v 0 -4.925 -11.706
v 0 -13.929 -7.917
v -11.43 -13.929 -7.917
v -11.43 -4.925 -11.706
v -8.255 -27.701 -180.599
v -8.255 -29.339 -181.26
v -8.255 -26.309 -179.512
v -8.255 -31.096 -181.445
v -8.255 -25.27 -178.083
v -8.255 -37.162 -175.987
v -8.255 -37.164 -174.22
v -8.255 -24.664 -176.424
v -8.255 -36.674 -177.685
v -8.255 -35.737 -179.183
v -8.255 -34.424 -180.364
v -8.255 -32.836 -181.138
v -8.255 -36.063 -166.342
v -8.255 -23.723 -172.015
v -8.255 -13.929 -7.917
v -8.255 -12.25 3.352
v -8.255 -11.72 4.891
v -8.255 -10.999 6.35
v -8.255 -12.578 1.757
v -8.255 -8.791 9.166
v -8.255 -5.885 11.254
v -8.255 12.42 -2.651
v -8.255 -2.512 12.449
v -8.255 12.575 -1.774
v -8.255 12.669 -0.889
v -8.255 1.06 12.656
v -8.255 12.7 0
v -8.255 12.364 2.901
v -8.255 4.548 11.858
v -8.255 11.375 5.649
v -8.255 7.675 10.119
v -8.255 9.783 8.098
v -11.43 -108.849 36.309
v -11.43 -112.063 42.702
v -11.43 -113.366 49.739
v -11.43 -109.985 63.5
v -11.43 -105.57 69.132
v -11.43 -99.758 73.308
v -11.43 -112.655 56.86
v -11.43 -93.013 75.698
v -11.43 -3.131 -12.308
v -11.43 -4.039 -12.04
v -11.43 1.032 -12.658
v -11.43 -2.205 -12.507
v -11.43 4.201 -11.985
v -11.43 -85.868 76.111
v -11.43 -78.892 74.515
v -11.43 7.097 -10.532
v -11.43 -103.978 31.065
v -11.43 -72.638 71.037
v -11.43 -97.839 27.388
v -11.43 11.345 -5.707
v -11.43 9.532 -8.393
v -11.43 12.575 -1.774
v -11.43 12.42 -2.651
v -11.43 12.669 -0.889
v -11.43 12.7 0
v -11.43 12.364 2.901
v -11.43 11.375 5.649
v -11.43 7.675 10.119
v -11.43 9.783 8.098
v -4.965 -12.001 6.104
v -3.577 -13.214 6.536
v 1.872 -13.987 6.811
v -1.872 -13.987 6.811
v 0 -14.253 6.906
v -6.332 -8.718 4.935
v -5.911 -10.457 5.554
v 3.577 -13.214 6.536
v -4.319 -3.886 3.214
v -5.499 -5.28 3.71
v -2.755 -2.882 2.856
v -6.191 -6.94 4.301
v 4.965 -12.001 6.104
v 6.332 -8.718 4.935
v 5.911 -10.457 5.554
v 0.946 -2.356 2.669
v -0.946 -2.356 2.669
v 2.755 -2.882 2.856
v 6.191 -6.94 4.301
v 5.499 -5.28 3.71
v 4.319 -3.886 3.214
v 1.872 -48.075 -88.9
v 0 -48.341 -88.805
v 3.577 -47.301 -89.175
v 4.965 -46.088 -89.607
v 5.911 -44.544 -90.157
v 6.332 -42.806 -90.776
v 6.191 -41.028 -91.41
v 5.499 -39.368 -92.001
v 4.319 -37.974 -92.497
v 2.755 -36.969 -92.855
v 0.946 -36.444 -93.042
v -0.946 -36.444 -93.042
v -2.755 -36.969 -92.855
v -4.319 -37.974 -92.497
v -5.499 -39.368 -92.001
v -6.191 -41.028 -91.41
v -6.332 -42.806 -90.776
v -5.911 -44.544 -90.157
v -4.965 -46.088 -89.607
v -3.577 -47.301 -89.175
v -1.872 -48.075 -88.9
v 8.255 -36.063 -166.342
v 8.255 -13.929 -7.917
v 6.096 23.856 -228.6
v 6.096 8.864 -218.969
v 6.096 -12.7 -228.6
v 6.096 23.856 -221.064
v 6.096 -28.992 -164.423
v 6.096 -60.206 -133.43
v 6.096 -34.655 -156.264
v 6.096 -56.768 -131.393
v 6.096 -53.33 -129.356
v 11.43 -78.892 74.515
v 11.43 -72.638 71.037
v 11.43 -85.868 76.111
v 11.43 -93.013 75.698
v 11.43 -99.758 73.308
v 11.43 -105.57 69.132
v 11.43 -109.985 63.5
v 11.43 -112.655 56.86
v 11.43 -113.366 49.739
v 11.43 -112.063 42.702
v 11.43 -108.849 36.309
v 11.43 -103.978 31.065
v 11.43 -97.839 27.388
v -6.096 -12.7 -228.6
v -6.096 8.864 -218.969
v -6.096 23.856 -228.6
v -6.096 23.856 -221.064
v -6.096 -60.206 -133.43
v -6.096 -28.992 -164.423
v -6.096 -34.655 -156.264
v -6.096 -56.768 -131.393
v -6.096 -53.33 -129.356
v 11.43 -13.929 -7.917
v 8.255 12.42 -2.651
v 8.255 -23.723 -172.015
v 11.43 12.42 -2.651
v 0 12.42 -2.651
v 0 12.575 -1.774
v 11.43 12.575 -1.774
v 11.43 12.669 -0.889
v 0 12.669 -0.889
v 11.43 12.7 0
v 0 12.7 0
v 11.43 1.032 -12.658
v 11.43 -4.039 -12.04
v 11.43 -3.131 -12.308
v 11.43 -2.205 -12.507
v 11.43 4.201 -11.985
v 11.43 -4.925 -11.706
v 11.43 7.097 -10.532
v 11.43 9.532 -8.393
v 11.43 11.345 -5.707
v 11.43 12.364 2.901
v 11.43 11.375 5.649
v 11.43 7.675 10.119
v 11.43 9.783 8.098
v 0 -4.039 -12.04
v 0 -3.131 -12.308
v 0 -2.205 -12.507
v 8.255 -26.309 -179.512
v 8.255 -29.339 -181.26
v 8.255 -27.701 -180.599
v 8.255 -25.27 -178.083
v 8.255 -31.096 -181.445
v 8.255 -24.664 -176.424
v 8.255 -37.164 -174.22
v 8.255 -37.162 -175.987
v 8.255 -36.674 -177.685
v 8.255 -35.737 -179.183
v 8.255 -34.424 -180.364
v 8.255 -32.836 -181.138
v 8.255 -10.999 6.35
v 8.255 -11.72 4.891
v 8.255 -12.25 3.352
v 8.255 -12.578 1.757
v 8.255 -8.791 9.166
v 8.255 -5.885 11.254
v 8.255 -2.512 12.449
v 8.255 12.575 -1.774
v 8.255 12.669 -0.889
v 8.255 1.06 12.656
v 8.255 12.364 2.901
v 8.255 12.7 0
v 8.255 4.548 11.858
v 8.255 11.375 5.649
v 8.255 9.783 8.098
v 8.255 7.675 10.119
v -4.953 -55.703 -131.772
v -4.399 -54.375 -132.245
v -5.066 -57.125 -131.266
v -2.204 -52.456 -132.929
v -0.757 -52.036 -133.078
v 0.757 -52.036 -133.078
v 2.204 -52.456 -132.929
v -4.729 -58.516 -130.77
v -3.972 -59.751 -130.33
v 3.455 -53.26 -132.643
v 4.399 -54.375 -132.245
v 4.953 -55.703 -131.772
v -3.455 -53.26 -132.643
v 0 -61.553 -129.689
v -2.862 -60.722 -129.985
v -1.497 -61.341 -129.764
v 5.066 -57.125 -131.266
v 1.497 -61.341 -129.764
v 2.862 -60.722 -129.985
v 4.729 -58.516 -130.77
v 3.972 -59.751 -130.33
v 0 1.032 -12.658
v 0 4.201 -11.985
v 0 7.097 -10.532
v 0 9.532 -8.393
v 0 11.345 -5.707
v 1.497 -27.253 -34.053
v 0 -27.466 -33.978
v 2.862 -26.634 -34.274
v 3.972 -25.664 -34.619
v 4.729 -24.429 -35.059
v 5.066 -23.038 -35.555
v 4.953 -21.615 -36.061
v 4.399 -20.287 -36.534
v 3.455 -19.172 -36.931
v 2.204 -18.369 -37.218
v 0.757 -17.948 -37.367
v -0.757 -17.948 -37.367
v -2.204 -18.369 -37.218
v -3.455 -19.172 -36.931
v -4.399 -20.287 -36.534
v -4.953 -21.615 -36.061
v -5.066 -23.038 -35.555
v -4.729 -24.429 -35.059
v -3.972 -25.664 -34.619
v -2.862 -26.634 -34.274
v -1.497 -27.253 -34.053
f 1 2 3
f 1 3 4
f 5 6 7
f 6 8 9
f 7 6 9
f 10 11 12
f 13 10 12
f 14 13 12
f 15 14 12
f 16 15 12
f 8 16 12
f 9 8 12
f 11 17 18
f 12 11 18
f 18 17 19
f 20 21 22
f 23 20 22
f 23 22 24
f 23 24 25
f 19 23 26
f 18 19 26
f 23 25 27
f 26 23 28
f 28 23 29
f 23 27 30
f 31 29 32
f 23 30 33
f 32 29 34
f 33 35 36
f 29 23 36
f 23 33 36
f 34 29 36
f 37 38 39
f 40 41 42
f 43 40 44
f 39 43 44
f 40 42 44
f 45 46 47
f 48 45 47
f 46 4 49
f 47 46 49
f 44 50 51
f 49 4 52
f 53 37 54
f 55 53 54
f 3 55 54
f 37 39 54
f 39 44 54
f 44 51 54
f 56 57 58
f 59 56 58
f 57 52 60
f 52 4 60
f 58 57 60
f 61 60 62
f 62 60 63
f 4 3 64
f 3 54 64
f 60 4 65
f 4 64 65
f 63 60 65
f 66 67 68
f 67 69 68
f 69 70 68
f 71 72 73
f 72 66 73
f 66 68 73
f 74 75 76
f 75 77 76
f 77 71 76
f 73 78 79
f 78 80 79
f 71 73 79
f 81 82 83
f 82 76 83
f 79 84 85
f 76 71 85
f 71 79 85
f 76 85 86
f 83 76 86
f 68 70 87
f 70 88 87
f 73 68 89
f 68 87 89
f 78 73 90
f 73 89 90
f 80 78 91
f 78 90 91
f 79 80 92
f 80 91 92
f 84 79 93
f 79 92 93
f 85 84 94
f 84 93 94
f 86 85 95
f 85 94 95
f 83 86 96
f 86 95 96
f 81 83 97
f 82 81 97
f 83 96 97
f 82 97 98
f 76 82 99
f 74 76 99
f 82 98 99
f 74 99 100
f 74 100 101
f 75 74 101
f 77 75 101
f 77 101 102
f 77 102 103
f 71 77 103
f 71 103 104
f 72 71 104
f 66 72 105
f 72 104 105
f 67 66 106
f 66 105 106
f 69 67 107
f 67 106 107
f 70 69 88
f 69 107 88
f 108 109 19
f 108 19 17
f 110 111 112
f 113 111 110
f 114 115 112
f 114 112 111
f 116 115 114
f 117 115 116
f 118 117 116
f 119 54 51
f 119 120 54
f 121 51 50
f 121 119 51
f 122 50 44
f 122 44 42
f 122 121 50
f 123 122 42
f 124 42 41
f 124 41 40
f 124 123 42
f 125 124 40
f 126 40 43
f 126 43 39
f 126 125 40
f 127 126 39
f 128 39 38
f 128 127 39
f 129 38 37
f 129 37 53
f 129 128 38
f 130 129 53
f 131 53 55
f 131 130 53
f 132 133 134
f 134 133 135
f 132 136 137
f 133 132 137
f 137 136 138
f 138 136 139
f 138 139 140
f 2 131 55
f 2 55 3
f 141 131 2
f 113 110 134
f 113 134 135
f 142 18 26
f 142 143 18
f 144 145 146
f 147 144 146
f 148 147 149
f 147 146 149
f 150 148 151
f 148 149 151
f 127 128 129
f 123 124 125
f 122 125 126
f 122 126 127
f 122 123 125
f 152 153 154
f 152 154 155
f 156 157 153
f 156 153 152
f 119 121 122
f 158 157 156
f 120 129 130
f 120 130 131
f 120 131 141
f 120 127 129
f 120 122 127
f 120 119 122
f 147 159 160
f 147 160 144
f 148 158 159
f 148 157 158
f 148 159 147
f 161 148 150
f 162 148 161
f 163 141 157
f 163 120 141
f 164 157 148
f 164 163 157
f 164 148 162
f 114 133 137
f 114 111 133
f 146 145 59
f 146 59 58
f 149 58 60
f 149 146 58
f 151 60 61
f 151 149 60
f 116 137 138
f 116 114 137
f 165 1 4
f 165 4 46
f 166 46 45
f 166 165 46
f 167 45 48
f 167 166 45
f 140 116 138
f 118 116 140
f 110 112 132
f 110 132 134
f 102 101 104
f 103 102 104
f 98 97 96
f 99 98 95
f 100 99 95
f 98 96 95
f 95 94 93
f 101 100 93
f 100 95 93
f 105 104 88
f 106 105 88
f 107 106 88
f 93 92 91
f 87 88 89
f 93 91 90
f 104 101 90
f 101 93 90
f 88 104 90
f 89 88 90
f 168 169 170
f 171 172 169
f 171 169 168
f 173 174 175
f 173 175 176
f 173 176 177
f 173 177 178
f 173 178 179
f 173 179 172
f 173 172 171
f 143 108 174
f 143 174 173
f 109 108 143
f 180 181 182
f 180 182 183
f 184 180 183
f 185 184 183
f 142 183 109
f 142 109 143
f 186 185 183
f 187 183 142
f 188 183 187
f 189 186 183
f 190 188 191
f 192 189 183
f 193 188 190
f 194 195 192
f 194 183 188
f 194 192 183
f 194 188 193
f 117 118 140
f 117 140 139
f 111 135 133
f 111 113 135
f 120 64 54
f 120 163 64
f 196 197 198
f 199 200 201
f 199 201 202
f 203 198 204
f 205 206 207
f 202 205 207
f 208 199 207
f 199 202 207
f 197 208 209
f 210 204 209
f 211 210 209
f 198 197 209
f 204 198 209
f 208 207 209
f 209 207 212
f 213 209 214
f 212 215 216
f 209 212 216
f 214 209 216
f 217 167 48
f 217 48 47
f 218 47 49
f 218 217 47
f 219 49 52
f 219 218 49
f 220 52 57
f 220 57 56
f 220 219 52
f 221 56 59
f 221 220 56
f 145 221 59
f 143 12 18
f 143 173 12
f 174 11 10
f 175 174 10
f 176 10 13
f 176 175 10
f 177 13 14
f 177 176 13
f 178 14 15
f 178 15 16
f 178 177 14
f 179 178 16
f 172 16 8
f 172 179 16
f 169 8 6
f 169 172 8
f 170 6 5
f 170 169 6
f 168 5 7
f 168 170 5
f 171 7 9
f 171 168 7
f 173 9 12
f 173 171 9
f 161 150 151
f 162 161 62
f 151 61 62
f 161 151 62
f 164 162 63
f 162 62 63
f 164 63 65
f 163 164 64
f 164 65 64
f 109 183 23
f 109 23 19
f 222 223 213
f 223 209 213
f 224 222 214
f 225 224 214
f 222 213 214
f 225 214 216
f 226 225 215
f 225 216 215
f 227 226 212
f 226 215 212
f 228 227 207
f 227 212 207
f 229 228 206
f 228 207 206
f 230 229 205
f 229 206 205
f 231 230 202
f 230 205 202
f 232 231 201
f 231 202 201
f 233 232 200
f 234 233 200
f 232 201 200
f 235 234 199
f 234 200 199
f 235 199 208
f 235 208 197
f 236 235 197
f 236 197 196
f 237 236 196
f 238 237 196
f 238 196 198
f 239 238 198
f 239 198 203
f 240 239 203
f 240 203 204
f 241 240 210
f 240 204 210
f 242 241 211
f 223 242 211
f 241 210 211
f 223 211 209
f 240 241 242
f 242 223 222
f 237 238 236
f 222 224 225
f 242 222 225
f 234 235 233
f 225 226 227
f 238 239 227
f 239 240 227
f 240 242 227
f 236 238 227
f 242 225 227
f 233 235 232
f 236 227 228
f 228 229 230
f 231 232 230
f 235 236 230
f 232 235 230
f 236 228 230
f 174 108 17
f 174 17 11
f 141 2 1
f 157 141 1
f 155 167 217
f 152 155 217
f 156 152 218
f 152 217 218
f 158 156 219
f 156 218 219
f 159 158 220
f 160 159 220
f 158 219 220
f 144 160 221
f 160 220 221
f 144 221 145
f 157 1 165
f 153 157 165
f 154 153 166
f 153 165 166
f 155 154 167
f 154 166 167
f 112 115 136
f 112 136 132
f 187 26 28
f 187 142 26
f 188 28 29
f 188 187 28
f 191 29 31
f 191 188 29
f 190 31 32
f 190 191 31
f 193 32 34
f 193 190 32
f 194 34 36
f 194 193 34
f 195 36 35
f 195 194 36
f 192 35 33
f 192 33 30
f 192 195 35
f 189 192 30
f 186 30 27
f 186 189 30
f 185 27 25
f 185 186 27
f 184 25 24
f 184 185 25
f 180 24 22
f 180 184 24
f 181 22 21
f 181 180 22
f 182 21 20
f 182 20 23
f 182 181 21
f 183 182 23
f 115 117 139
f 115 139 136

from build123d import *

# Parameters (mm, degrees)
F1_DEPTH = 11.43
F2_DEPTH = 8.255
F3_DEPTH = 6.096


with BuildPart() as f1:
    # F0 (on Right) → F1 (new body, symmetric)
    with BuildSketch(Plane.YZ):
        with BuildLine():
            ThreePointArc((-65.9911357684, 38.1), (-63.4536650368, 44.2259962544), (-62.5881810245, 50.8))
            ThreePointArc((-62.5881810245, 50.8), (-65.2389992765, 62.097554151), (-72.6381597485, 71.0370167472))
            ThreePointArc((-72.6381597485, 71.0370167472), (-109.9852262806, 63.5), (-97.8389409864, 27.3879832528))
            ThreePointArc((-97.8389409864, 27.3879832528), (-79.890657495, 26.7253221685), (-65.9911357684, 38.1))
        make_face()
        with BuildLine():
            ThreePointArc((-72.6381597485, 71.0370167472), (-65.2389992765, 62.097554151), (-62.5881810245, 50.8))
            ThreePointArc((-62.5881810245, 50.8), (-63.4536650368, 44.2259962544), (-65.9911357684, 38.1))
            Line((-65.9911357684, 38.1), (-10.9985226281, 6.35))
            ThreePointArc((-10.9985226281, 6.35), (-2.5123389157, 12.4490221774), (7.675010638, 10.1185083736))
            Line((7.675010638, 10.1185083736), (-72.6381597485, 71.0370167472))
        make_face()
        with BuildLine():
            Line((-10.9985226281, 6.35), (-65.9911357684, 38.1))
            ThreePointArc((-65.9911357684, 38.1), (-79.890657495, 26.7253221685), (-97.8389409864, 27.3879832528))
            Line((-97.8389409864, 27.3879832528), (-13.9294910287, -7.9174694553))
            Line((-13.9294910287, -7.9174694553), (-12.5778413298, 1.7572442865))
            ThreePointArc((-12.5778413298, 1.7572442865), (-12.0097704237, 4.1298201378), (-10.9985226281, 6.35))
        make_face()
        with BuildLine():
            Line((-12.5778413298, 1.7572442865), (-13.9294910287, -7.9174694553))
            Line((-13.9294910287, -7.9174694553), (-4.925379981, -11.7060083736))
            ThreePointArc((-4.925379981, -11.7060083736), (-11.0410815644, -6.2757085567), (-12.5778413298, 1.7572442865))
        make_face()
        with BuildLine():
            Line((0, 0), (-10.9985226281, 6.35))
            ThreePointArc((-10.9985226281, 6.35), (-12.0097704237, 4.1298201378), (-12.5778413298, 1.7572442865))
            ThreePointArc((-12.5778413298, 1.7572442865), (-11.0410815644, -6.2757085567), (-4.925379981, -11.7060083736))
            ThreePointArc((-4.925379981, -11.7060083736), (-3.587782482, -12.1826851253), (-2.2053318564, -12.5070584633))
            Line((-2.2053318564, -12.5070584633), (0, 0))
        make_face()
        with BuildLine():
            ThreePointArc((12.7, 0), (11.374590874, 5.6487770755), (7.675010638, 10.1185083736))
            ThreePointArc((7.675010638, 10.1185083736), (-2.5123389157, 12.4490221774), (-10.9985226281, 6.35))
            Line((-10.9985226281, 6.35), (0, 0))
            Line((0, 0), (-2.2053318564, -12.5070584633))
            ThreePointArc((-2.2053318564, -12.5070584633), (7.097457242, -10.5316713155), (12.4203176258, -2.6506056054))
            ThreePointArc((12.4203176258, -2.6506056054), (12.6298858634, -1.3326601504), (12.7, 0))
        make_face()
    extrude(amount=F1_DEPTH, both=True)


with BuildPart() as f2:
    # F0 (on Right) → F2 (new body, symmetric)
    with BuildSketch(Plane.YZ):
        with BuildLine():
            ThreePointArc((12.7, 0), (11.374590874, 5.6487770755), (7.675010638, 10.1185083736))
            ThreePointArc((7.675010638, 10.1185083736), (-2.5123389157, 12.4490221774), (-10.9985226281, 6.35))
            Line((-10.9985226281, 6.35), (0, 0))
            Line((0, 0), (-2.2053318564, -12.5070584633))
            ThreePointArc((-2.2053318564, -12.5070584633), (7.097457242, -10.5316713155), (12.4203176258, -2.6506056054))
            ThreePointArc((12.4203176258, -2.6506056054), (12.6298858634, -1.3326601504), (12.7, 0))
        make_face()
        with BuildLine():
            Line((0, 0), (-10.9985226281, 6.35))
            ThreePointArc((-10.9985226281, 6.35), (-12.0097704237, 4.1298201378), (-12.5778413298, 1.7572442865))
            ThreePointArc((-12.5778413298, 1.7572442865), (-11.0410815644, -6.2757085567), (-4.925379981, -11.7060083736))
            ThreePointArc((-4.925379981, -11.7060083736), (-3.587782482, -12.1826851253), (-2.2053318564, -12.5070584633))
            Line((-2.2053318564, -12.5070584633), (0, 0))
        make_face()
        with BuildLine():
            Line((-23.723489121, -172.0147535919), (12.4203176258, -2.6506056054))
            ThreePointArc((12.4203176258, -2.6506056054), (7.097457242, -10.5316713155), (-2.2053318564, -12.5070584633))
            Line((-2.2053318564, -12.5070584633), (-28.992237411, -164.4231489389))
            Line((-28.992237411, -164.4231489389), (-23.723489121, -172.0147535919))
        make_face()
        with BuildLine():
            Line((-4.925379981, -11.7060083736), (-13.9294910287, -7.9174694553))
            Line((-13.9294910287, -7.9174694553), (-34.6549081477, -156.2639515077))
            Line((-34.6549081477, -156.2639515077), (-28.992237411, -164.4231489389))
            Line((-28.992237411, -164.4231489389), (-2.2053318564, -12.5070584633))
            ThreePointArc((-2.2053318564, -12.5070584633), (-3.587782482, -12.1826851253), (-4.925379981, -11.7060083736))
        make_face()
        with BuildLine():
            Line((-12.5778413298, 1.7572442865), (-13.9294910287, -7.9174694553))
            Line((-13.9294910287, -7.9174694553), (-4.925379981, -11.7060083736))
            ThreePointArc((-4.925379981, -11.7060083736), (-11.0410815644, -6.2757085567), (-12.5778413298, 1.7572442865))
        make_face()
        with BuildLine():
            Line((-30.8746459892, -175.0988184856), (-34.1112782872, -169.6356041051))
            ThreePointArc((-34.1112782872, -169.6356041051), (-36.1603494719, -171.5797506129), (-37.1635666541, -174.2201963423))
            ThreePointArc((-37.1635666541, -174.2201963423), (-34.4239015535, -180.3642989897), (-27.7007466935, -180.5987151447))
            Line((-27.7007466935, -180.5987151447), (-30.8746459892, -175.0988184856))
        make_face()
        with BuildLine():
            Line((-28.992237411, -164.4231489389), (-34.6549081477, -156.2639515077))
            Line((-34.6549081477, -156.2639515077), (-36.0628382689, -166.341504073))
            Line((-36.0628382689, -166.341504073), (-34.1112782872, -169.6356041051))
            ThreePointArc((-34.1112782872, -169.6356041051), (-32.0124519954, -168.8515872995), (-29.771980061, -168.8452892539))
            Line((-29.771980061, -168.8452892539), (-28.992237411, -164.4231489389))
        make_face()
        with BuildLine():
            Line((-34.1112782872, -169.6356041051), (-36.0628382689, -166.341504073))
            Line((-36.0628382689, -166.341504073), (-37.1635666541, -174.2201963423))
            ThreePointArc((-37.1635666541, -174.2201963423), (-36.1603494719, -171.5797506129), (-34.1112782872, -169.6356041051))
        make_face()
        with BuildLine():
            Line((-23.723489121, -172.0147535919), (-28.992237411, -164.4231489389))
            Line((-28.992237411, -164.4231489389), (-29.771980061, -168.8452892539))
            ThreePointArc((-29.771980061, -168.8452892539), (-26.0102637754, -171.0171171641), (-24.5246459892, -175.0988184856))
            ThreePointArc((-24.5246459892, -175.0988184856), (-24.5597030575, -175.7651485608), (-24.6644871763, -176.4241212882))
            Line((-24.6644871763, -176.4241212882), (-23.723489121, -172.0147535919))
        make_face()
        with BuildLine():
            ThreePointArc((-24.5246459892, -175.0988184856), (-26.0102637754, -171.0171171641), (-29.771980061, -168.8452892539))
            Line((-29.771980061, -168.8452892539), (-30.8746459892, -175.0988184856))
            Line((-30.8746459892, -175.0988184856), (-27.7007466935, -180.5987151447))
            ThreePointArc((-27.7007466935, -180.5987151447), (-25.7392837709, -178.8338626469), (-24.6644871763, -176.4241212882))
            ThreePointArc((-24.6644871763, -176.4241212882), (-24.5597030575, -175.7651485608), (-24.5246459892, -175.0988184856))
        make_face()
        with BuildLine():
            ThreePointArc((-29.771980061, -168.8452892539), (-32.0124519954, -168.8515872995), (-34.1112782872, -169.6356041051))
            Line((-34.1112782872, -169.6356041051), (-30.8746459892, -175.0988184856))
            Line((-30.8746459892, -175.0988184856), (-29.771980061, -168.8452892539))
        make_face()
        with BuildLine():
            Line((-23.723489121, -172.0147535919), (-28.992237411, -164.4231489389))
            Line((-28.992237411, -164.4231489389), (-29.771980061, -168.8452892539))
            ThreePointArc((-29.771980061, -168.8452892539), (-26.0102637754, -171.0171171641), (-24.5246459892, -175.0988184856))
            ThreePointArc((-24.5246459892, -175.0988184856), (-24.5597030575, -175.7651485608), (-24.6644871763, -176.4241212882))
            Line((-24.6644871763, -176.4241212882), (-23.723489121, -172.0147535919))
        make_face()
    extrude(amount=F2_DEPTH, both=True)


with BuildPart() as f3:
    # F0 (on Right) → F3 (new body, symmetric)
    with BuildSketch(Plane.YZ):
        with BuildLine():
            Line((-37.1635666541, -174.2201963423), (-36.0628382689, -166.341504073))
            Line((-36.0628382689, -166.341504073), (-56.7677043733, -131.3931034415))
            Line((-56.7677043733, -131.3931034415), (-60.2058892669, -133.4300252055))
            Line((-60.2058892669, -133.4300252055), (-12.7, -228.6))
            Line((-12.7, -228.6), (0, -228.6))
            Line((0, -228.6), (-27.7007466935, -180.5987151447))
            ThreePointArc((-27.7007466935, -180.5987151447), (-34.4239015535, -180.3642989897), (-37.1635666541, -174.2201963423))
        make_face()
        Polygon((-36.0628382689, -166.341504073), (-34.6549081477, -156.2639515077), (-53.3295194797, -129.3561816774), (-56.7677043733, -131.3931034415), align=None)
        with BuildLine():
            Line((-28.992237411, -164.4231489389), (-34.6549081477, -156.2639515077))
            Line((-34.6549081477, -156.2639515077), (-36.0628382689, -166.341504073))
            Line((-36.0628382689, -166.341504073), (-34.1112782872, -169.6356041051))
            ThreePointArc((-34.1112782872, -169.6356041051), (-32.0124519954, -168.8515872995), (-29.771980061, -168.8452892539))
            Line((-29.771980061, -168.8452892539), (-28.992237411, -164.4231489389))
        make_face()
        with BuildLine():
            Line((-34.1112782872, -169.6356041051), (-36.0628382689, -166.341504073))
            Line((-36.0628382689, -166.341504073), (-37.1635666541, -174.2201963423))
            ThreePointArc((-37.1635666541, -174.2201963423), (-36.1603494719, -171.5797506129), (-34.1112782872, -169.6356041051))
        make_face()
        with BuildLine():
            Line((-30.8746459892, -175.0988184856), (-34.1112782872, -169.6356041051))
            ThreePointArc((-34.1112782872, -169.6356041051), (-36.1603494719, -171.5797506129), (-37.1635666541, -174.2201963423))
            ThreePointArc((-37.1635666541, -174.2201963423), (-34.4239015535, -180.3642989897), (-27.7007466935, -180.5987151447))
            Line((-27.7007466935, -180.5987151447), (-30.8746459892, -175.0988184856))
        make_face()
        with BuildLine():
            ThreePointArc((-29.771980061, -168.8452892539), (-32.0124519954, -168.8515872995), (-34.1112782872, -169.6356041051))
            Line((-34.1112782872, -169.6356041051), (-30.8746459892, -175.0988184856))
            Line((-30.8746459892, -175.0988184856), (-29.771980061, -168.8452892539))
        make_face()
        with BuildLine():
            Line((-23.723489121, -172.0147535919), (-28.992237411, -164.4231489389))
            Line((-28.992237411, -164.4231489389), (-29.771980061, -168.8452892539))
            ThreePointArc((-29.771980061, -168.8452892539), (-26.0102637754, -171.0171171641), (-24.5246459892, -175.0988184856))
            ThreePointArc((-24.5246459892, -175.0988184856), (-24.5597030575, -175.7651485608), (-24.6644871763, -176.4241212882))
            Line((-24.6644871763, -176.4241212882), (-23.723489121, -172.0147535919))
        make_face()
        with BuildLine():
            ThreePointArc((-24.5246459892, -175.0988184856), (-26.0102637754, -171.0171171641), (-29.771980061, -168.8452892539))
            Line((-29.771980061, -168.8452892539), (-30.8746459892, -175.0988184856))
            Line((-30.8746459892, -175.0988184856), (-27.7007466935, -180.5987151447))
            ThreePointArc((-27.7007466935, -180.5987151447), (-25.7392837709, -178.8338626469), (-24.6644871763, -176.4241212882))
            ThreePointArc((-24.6644871763, -176.4241212882), (-24.5597030575, -175.7651485608), (-24.5246459892, -175.0988184856))
        make_face()
        with BuildLine():
            Line((8.8639849224, -218.9692114556), (-23.723489121, -172.0147535919))
            Line((-23.723489121, -172.0147535919), (-24.6644871763, -176.4241212882))
            ThreePointArc((-24.6644871763, -176.4241212882), (-25.7392837709, -178.8338626469), (-27.7007466935, -180.5987151447))
            Line((-27.7007466935, -180.5987151447), (0, -228.6))
            Line((0, -228.6), (23.8561810277, -228.6))
            Line((23.8561810277, -228.6), (23.8561810277, -221.0637641104))
            Line((23.8561810277, -221.0637641104), (8.8639849224, -218.9692114556))
        make_face()
    extrude(amount=F3_DEPTH, both=True)


with BuildPart() as f5:
    # F4 (on Right) → F5 (revolve)
    with BuildSketch(Plane.YZ):
        Polygon((-48.3406871308, -88.8051672484), (-47.1442994072, -89.2312616215), (-27.4657054166, -33.977708061), (-22.6801545222, -35.6820855535), (-8.2711986617, 4.7753787739), (-14.2531372797, 6.9058506396), align=None)
        Polygon((-47.1442994072, -89.2312616215), (-42.3587485128, -90.9356391141), (-22.6801545222, -35.6820855535), (-27.4657054166, -33.977708061), align=None)
    revolve(axis=Axis((0, -25.3149735873, -43.0801301701), (0, 0.3355073804, 0.9420375776)))


with BuildPart() as f6:
    # F4 (on Right) → F6 (revolve)
    with BuildSketch(Plane.YZ):
        Polygon((-47.1442994072, -89.2312616215), (-42.3587485128, -90.9356391141), (-22.6801545222, -35.6820855535), (-27.4657054166, -33.977708061), align=None)
        Polygon((-61.5532552677, -129.6887259489), (-56.7677043733, -131.3931034415), (-42.3587485128, -90.9356391141), (-47.1442994072, -89.2312616215), align=None)
    revolve(axis=Axis((0, -39.7239294478, -83.5375944975), (0, 0.3355073804, 0.9420375776)))


solid = Compound([f1.part, f2.part, f3.part, f5.part, f6.part])
